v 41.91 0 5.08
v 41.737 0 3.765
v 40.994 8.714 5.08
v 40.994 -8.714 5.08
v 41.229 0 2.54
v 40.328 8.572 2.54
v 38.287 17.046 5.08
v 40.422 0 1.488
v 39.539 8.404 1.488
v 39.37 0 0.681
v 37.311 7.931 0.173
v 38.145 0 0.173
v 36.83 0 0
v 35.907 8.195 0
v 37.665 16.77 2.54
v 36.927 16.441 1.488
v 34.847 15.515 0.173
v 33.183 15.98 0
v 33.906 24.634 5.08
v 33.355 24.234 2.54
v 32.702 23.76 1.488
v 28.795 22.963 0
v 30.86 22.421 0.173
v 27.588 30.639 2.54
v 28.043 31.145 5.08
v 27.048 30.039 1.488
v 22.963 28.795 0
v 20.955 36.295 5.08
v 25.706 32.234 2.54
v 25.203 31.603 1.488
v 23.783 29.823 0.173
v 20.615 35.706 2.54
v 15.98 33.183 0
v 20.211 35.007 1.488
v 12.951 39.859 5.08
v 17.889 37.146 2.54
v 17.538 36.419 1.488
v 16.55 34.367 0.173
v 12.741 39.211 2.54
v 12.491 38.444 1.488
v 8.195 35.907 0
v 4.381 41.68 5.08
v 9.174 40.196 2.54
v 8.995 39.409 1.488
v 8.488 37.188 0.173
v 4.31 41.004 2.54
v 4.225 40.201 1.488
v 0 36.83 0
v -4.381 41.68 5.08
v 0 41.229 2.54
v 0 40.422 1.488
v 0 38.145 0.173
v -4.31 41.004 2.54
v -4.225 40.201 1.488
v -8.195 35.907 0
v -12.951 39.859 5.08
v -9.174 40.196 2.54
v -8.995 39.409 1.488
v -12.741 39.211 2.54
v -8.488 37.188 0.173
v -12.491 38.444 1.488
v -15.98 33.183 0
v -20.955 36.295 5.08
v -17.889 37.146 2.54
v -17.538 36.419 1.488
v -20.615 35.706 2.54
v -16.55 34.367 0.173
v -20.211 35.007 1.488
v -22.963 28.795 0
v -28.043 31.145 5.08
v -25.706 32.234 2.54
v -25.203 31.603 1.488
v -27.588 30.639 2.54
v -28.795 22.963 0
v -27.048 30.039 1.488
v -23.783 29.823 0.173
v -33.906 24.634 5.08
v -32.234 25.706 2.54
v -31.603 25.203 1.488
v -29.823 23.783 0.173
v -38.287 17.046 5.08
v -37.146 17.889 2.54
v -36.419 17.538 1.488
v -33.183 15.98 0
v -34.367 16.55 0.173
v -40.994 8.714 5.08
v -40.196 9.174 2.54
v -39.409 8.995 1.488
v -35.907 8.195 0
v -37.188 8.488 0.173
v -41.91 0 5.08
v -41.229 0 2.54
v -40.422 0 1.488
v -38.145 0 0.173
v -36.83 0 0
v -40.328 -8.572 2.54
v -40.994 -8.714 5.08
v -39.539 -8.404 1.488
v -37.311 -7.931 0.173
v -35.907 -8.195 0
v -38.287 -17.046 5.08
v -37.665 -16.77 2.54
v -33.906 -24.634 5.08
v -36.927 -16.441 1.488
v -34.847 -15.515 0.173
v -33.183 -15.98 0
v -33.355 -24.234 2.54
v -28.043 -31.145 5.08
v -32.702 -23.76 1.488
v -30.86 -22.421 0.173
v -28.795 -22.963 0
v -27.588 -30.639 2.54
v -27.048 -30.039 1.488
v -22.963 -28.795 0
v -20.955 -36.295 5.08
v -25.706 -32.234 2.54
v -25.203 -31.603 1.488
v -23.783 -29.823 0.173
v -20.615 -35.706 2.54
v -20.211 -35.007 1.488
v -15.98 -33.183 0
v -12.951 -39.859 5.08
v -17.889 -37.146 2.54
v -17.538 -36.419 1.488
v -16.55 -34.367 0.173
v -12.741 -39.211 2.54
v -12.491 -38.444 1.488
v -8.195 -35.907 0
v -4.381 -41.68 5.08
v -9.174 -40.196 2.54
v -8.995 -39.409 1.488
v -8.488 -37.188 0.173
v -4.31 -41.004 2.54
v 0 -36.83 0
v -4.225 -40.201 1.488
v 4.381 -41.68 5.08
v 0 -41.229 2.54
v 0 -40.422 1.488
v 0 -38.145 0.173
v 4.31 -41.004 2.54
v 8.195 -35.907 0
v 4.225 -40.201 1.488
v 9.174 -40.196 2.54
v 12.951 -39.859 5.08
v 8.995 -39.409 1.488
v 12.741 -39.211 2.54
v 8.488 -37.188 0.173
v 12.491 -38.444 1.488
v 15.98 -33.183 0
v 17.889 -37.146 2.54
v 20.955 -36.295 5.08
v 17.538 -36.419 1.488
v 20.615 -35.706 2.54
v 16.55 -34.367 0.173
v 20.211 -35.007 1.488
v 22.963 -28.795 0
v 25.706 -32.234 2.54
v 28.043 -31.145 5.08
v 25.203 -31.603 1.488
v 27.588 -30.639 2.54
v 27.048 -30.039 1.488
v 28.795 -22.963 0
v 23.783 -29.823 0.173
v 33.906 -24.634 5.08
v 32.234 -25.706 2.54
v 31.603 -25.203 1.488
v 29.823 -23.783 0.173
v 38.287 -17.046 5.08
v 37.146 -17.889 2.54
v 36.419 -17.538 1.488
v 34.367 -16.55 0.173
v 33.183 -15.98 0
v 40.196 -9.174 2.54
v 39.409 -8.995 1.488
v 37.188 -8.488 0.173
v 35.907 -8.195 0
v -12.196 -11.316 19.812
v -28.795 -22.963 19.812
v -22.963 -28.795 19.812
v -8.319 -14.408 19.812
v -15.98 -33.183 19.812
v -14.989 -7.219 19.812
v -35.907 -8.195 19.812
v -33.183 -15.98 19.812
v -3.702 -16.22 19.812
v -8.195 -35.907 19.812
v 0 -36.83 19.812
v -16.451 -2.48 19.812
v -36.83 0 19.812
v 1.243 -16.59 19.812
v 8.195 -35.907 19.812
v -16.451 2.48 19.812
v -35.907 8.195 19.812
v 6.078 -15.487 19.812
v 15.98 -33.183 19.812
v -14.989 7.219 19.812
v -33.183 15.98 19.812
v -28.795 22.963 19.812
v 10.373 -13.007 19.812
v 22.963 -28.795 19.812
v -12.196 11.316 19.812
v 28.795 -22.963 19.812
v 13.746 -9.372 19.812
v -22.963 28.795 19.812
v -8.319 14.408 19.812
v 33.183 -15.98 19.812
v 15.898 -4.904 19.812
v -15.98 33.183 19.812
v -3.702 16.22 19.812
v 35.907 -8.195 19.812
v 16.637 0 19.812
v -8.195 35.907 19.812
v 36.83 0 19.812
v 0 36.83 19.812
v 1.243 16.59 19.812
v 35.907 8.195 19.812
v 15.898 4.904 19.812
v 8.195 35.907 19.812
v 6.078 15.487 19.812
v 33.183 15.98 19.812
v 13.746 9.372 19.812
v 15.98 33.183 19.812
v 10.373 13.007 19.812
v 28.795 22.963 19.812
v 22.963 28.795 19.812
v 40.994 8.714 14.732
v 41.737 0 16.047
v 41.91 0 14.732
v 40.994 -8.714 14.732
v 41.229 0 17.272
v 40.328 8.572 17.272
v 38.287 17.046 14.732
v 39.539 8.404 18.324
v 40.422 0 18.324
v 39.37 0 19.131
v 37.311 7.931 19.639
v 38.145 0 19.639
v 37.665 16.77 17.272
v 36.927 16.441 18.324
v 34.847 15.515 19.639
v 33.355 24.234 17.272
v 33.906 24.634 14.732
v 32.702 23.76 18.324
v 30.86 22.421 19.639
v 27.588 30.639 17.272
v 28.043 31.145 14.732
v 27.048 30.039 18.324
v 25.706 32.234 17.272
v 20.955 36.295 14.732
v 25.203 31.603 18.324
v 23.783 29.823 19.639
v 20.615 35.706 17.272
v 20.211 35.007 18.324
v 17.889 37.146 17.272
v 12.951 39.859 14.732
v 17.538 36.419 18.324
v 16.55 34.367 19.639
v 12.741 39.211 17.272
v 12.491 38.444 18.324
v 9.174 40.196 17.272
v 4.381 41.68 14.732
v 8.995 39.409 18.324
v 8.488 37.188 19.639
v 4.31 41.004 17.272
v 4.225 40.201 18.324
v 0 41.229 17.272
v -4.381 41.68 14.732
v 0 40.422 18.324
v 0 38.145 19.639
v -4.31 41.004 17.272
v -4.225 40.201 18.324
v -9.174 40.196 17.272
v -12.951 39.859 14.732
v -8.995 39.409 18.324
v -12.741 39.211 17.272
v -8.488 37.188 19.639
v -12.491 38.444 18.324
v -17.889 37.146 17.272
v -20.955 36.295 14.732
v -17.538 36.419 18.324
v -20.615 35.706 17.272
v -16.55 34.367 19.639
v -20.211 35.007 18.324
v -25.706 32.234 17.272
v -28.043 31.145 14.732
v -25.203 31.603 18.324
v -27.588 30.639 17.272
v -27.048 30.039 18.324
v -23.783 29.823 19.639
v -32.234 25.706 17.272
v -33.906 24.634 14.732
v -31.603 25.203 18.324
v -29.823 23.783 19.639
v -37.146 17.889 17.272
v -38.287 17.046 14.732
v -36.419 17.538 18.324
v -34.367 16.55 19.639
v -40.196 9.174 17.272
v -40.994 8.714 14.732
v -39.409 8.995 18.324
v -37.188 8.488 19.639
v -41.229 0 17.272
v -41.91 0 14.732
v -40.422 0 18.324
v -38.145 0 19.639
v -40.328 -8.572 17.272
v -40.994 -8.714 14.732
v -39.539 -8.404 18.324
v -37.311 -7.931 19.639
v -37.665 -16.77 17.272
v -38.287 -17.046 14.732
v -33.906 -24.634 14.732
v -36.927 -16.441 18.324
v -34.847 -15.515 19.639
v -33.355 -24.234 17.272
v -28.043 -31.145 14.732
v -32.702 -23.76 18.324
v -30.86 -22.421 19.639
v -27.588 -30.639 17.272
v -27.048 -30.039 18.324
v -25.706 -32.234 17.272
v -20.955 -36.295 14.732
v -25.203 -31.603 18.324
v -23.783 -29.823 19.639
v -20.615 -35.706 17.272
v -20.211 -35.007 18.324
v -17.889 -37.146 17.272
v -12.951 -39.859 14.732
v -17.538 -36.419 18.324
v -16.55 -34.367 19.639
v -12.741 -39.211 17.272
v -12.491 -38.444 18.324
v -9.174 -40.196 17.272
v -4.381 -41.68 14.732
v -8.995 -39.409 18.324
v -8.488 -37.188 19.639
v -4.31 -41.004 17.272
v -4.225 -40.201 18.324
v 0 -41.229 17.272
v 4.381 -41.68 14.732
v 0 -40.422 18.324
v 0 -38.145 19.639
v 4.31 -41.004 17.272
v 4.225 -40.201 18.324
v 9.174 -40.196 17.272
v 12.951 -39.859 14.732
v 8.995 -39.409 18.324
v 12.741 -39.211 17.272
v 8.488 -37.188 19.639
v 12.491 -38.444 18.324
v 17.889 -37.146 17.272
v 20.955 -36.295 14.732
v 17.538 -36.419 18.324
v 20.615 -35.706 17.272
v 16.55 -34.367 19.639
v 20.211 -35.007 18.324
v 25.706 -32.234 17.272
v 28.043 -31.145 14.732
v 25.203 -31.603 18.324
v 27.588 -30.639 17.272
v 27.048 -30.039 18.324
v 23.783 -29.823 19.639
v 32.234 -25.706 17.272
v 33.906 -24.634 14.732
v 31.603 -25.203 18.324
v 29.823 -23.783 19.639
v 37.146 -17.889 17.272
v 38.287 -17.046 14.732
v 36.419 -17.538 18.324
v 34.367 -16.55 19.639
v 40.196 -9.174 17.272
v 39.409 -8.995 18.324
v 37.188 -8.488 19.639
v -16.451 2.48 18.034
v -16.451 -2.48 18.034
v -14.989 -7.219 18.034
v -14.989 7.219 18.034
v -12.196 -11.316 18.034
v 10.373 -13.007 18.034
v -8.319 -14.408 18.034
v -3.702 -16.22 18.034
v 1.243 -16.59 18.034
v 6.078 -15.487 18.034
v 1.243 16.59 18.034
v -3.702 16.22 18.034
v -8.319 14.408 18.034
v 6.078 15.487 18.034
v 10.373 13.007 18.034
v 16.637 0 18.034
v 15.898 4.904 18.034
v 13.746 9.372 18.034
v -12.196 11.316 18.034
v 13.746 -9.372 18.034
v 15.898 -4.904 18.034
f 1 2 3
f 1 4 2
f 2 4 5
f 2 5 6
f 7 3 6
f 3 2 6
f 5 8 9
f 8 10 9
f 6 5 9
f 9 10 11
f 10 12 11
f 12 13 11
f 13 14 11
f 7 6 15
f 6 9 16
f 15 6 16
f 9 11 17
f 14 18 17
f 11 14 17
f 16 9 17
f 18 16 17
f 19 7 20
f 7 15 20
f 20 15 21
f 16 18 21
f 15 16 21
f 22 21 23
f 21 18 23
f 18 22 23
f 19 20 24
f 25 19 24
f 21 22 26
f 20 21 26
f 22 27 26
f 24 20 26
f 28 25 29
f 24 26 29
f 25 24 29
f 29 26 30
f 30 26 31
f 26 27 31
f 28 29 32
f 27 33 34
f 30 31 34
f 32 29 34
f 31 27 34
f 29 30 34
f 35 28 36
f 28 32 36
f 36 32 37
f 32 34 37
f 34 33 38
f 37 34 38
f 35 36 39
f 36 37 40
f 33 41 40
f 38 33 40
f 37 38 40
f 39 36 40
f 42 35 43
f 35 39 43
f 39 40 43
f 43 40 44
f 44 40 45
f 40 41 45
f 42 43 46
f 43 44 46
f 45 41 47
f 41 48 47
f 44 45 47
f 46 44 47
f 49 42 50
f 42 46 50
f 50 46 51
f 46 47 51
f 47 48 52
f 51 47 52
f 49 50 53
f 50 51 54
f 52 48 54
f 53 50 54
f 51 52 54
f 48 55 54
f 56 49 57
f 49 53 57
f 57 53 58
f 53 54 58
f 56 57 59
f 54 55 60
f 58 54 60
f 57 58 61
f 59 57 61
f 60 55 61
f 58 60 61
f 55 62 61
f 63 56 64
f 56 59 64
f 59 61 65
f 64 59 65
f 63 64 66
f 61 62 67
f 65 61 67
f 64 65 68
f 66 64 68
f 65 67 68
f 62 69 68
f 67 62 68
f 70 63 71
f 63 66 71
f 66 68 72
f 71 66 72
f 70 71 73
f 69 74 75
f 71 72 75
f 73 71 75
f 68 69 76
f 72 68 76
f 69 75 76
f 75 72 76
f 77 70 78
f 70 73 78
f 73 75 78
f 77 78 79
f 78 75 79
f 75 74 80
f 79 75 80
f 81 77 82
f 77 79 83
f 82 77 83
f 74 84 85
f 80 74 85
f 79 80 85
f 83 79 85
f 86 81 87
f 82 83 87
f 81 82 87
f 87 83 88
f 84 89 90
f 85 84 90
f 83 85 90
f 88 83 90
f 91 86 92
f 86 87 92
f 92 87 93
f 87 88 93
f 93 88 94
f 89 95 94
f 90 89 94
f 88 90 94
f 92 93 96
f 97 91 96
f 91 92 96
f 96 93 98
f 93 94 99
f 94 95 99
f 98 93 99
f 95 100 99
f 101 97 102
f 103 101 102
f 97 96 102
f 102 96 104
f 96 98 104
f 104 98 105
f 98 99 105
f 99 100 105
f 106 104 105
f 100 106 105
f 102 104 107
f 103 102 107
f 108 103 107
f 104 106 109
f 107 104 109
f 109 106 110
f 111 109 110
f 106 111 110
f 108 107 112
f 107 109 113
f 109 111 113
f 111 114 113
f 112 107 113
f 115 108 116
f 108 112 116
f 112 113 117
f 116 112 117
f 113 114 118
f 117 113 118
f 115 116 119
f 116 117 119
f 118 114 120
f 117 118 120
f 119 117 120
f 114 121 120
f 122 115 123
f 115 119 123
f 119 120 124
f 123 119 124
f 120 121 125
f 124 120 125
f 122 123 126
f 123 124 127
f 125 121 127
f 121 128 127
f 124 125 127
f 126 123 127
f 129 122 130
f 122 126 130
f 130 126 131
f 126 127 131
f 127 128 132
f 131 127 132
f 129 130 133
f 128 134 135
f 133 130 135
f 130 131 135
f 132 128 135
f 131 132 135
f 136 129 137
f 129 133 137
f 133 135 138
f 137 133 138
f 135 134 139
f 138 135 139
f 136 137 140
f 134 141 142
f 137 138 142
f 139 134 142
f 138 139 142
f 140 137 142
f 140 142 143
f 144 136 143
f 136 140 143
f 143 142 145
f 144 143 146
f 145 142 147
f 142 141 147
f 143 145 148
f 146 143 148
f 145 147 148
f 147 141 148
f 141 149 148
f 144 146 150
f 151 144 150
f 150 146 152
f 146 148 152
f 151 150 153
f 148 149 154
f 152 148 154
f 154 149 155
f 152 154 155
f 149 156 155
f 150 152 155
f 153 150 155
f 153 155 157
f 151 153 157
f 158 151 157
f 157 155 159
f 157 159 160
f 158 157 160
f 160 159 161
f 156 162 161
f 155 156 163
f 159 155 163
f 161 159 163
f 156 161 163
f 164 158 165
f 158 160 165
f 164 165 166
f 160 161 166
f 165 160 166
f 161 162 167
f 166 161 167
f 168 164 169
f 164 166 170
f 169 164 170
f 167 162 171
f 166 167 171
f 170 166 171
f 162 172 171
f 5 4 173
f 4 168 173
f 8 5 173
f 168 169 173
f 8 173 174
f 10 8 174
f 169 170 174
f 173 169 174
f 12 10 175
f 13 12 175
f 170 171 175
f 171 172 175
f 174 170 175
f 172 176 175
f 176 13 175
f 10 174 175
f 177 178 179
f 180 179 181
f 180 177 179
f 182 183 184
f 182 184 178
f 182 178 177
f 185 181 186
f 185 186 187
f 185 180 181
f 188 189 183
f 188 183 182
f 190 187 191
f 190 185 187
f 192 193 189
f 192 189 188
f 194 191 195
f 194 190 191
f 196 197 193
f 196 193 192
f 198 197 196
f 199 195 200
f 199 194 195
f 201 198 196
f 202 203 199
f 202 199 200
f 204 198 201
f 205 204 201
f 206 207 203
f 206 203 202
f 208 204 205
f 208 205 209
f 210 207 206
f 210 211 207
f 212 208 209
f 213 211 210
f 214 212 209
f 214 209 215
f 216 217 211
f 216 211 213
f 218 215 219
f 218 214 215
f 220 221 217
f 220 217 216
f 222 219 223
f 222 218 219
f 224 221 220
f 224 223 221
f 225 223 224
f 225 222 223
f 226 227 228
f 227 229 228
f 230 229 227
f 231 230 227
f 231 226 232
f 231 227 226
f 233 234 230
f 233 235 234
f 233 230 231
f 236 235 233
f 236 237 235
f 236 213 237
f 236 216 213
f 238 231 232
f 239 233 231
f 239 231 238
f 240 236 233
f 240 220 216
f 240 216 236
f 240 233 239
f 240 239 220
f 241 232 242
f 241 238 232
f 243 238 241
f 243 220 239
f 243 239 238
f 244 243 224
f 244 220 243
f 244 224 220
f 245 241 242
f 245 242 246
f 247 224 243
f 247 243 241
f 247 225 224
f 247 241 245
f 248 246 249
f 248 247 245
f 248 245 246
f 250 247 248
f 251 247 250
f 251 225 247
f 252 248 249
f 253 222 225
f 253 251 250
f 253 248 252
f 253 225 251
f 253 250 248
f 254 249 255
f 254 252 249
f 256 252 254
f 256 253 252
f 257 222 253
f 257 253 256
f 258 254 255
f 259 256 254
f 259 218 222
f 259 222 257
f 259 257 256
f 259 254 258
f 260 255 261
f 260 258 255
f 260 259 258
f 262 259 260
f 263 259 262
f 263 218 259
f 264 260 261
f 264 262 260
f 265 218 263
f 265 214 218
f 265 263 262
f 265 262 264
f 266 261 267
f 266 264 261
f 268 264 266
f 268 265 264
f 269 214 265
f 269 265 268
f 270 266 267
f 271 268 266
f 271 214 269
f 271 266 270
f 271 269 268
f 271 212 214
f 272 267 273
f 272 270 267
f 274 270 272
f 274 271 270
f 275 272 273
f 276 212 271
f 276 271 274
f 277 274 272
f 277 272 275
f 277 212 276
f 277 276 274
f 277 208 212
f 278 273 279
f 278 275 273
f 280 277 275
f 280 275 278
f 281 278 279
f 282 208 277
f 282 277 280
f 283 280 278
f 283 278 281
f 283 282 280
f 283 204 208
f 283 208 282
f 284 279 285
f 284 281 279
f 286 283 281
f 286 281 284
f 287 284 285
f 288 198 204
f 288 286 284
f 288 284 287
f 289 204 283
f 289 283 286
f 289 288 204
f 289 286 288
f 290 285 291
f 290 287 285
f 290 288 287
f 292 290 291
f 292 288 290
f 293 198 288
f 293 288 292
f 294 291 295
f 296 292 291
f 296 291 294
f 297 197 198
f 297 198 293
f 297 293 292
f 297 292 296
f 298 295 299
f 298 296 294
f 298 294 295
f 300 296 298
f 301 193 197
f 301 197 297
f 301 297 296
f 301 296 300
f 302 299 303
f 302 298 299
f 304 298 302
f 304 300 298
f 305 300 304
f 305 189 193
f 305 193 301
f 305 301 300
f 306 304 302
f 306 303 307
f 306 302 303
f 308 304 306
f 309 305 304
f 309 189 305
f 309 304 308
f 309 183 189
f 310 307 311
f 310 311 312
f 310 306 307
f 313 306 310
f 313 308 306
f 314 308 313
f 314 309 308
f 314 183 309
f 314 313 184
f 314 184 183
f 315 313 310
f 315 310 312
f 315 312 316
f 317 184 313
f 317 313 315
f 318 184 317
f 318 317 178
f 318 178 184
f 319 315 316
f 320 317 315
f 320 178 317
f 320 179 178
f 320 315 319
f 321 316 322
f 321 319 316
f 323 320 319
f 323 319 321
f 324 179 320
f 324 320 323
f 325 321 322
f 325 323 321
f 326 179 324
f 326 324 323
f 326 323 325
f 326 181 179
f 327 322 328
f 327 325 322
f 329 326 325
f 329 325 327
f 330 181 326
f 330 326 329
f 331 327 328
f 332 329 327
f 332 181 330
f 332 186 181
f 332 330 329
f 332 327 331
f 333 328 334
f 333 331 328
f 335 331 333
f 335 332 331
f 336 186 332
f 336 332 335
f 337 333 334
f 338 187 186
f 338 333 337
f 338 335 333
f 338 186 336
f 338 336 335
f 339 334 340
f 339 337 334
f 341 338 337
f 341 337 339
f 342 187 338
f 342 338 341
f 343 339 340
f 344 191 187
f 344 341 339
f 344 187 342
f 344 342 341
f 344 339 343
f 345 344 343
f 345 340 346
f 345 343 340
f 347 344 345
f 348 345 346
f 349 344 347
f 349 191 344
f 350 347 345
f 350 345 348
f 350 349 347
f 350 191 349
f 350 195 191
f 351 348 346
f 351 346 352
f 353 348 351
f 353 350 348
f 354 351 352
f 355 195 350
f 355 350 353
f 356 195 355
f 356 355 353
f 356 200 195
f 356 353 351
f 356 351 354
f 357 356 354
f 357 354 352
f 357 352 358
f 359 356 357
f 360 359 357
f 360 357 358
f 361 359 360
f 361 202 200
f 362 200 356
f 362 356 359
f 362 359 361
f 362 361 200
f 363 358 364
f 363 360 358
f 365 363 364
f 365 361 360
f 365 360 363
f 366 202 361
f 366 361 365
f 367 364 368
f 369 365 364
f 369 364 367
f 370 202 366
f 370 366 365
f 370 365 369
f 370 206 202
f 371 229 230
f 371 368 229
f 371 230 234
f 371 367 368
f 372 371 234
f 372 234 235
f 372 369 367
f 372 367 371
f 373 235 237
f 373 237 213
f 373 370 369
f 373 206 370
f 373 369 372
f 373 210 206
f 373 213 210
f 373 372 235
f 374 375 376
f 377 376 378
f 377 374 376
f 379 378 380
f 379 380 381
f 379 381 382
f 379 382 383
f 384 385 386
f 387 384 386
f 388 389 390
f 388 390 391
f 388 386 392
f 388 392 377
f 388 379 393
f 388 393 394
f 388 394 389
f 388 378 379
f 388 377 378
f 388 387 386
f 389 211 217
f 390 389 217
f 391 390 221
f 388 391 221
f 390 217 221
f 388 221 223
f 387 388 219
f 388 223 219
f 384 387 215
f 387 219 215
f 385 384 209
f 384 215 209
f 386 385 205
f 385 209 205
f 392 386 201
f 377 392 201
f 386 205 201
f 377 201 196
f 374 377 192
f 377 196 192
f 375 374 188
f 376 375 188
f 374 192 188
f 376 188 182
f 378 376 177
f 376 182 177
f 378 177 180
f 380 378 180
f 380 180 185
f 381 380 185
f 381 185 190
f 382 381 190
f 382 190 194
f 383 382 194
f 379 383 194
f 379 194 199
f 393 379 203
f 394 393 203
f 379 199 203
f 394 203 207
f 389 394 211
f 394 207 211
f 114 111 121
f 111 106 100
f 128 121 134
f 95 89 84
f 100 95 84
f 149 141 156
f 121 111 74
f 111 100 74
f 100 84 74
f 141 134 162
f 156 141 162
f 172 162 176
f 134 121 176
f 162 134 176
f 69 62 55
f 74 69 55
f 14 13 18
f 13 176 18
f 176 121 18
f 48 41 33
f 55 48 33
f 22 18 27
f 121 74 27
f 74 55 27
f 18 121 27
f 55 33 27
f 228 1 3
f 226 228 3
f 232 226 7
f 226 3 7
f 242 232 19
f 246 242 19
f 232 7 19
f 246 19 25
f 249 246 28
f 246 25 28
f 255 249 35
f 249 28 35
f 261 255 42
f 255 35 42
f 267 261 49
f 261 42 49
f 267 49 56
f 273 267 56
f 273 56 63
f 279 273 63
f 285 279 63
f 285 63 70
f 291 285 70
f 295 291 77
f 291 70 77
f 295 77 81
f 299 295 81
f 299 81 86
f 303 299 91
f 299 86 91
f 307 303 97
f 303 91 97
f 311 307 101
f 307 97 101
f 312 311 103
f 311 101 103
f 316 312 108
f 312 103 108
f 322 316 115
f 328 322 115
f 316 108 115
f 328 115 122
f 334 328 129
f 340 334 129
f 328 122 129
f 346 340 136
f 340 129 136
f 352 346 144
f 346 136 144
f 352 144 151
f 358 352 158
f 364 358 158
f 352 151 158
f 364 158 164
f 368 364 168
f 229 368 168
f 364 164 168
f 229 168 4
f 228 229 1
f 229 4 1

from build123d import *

# Parameters (mm, degrees)
F0_R     = 41.91
F1_DEPTH = 19.812
F2_R     = 16.637
F3_DEPTH = 1.778
F4_R     = 5.08


with BuildPart() as f1:
    # F0 (on Top) → F1 (new body)
    with BuildSketch(Plane.XY):
        Circle(F0_R)
    extrude(amount=F1_DEPTH)

    # F2 (on face) → F3 (cut)
    with BuildSketch(Plane.XY.offset(19.812)):
        Circle(F2_R)
    extrude(amount=-F3_DEPTH, mode=Mode.SUBTRACT)

    # F4
    f4_edges = [f1.edges().sort_by_distance(p)[0] for p in [
        (-41.91, 0, 0),
        (-41.91, 0, 19.812),
    ]]
    fillet(f4_edges, radius=F4_R)


solid = f1.part
